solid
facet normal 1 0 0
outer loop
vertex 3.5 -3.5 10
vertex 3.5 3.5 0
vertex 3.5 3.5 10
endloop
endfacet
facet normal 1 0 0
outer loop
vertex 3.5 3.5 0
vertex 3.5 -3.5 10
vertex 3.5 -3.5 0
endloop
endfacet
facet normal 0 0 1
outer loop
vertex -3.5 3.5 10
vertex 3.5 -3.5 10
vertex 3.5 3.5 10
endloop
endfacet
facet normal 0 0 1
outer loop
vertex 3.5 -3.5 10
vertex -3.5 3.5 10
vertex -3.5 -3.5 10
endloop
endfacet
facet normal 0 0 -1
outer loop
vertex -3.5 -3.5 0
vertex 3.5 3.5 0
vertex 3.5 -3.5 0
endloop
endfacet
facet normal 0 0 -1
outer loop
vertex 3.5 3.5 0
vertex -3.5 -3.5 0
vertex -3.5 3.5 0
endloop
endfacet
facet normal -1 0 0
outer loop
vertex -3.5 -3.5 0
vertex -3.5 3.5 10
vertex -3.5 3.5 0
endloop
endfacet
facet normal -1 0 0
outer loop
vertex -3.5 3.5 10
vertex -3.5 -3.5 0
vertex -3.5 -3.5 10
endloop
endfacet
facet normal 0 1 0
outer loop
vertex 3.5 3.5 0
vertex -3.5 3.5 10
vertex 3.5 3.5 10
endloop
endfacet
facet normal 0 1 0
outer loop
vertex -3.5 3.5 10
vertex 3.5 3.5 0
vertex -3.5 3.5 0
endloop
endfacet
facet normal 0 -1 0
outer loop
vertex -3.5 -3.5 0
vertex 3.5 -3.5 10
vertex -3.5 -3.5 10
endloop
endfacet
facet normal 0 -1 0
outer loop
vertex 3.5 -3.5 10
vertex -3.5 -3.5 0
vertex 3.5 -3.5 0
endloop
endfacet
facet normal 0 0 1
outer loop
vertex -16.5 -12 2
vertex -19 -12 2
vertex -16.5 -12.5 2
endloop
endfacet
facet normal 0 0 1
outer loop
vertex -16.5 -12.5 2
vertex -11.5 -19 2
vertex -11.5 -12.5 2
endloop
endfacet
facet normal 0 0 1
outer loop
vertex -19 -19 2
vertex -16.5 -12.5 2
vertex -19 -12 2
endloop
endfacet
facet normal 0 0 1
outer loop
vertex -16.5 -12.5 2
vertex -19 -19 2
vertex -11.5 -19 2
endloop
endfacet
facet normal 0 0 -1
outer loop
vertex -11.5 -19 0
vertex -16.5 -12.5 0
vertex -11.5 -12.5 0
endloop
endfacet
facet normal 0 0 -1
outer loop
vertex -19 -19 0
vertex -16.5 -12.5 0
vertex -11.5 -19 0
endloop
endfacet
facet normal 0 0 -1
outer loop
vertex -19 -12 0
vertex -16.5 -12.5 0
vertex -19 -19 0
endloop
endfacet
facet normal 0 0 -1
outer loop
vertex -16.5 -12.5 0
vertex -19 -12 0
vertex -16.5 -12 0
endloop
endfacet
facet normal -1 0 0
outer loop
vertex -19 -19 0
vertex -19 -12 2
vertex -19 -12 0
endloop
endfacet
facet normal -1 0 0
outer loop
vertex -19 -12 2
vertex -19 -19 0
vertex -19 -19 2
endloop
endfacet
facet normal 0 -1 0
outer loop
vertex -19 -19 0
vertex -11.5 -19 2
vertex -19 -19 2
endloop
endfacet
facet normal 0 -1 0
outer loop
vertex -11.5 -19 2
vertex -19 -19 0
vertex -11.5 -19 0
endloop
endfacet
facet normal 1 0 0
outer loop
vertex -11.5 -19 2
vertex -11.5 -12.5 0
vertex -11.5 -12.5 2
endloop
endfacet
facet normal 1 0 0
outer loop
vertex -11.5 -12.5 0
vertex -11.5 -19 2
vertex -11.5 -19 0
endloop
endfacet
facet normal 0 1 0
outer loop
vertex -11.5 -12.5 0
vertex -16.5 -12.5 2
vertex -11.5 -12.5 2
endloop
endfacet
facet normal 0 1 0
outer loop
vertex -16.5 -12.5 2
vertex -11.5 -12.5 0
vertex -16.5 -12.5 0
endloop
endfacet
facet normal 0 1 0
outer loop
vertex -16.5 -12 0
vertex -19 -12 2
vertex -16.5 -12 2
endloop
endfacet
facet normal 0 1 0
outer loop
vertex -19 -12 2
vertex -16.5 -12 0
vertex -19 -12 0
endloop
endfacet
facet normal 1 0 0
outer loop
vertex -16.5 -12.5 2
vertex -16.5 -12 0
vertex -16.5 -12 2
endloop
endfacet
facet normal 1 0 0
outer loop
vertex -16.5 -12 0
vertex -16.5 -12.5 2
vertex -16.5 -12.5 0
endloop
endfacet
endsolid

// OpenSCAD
translate([0, 0, 5]) color([0,1,0,0.9]) cube([7, 7, 10], center=true);
translate([-18.75, -18.75, 1]) color([1,0,0]) cube([0.5, 0.5, 2], center=true);
translate([-18.25, -18.75, 1]) color([1,0,0]) cube([0.5, 0.5, 2], center=true);
translate([-17.75, -18.75, 1]) color([1,0,0]) cube([0.5, 0.5, 2], center=true);
translate([-17.25, -18.75, 1]) color([1,0,0]) cube([0.5, 0.5, 2], center=true);
translate([-16.75, -18.75, 1]) color([1,0,0]) cube([0.5, 0.5, 2], center=true);
translate([-16.25, -18.75, 1]) color([1,0,0]) cube([0.5, 0.5, 2], center=true);
translate([-15.75, -18.75, 1]) color([1,0,0]) cube([0.5, 0.5, 2], center=true);
translate([-15.25, -18.75, 1]) color([1,0,0]) cube([0.5, 0.5, 2], center=true);
translate([-14.75, -18.75, 1]) color([1,0,0]) cube([0.5, 0.5, 2], center=true);
translate([-14.25, -18.75, 1]) color([1,0,0]) cube([0.5, 0.5, 2], center=true);
translate([-13.75, -18.75, 1]) color([1,0,0]) cube([0.5, 0.5, 2], center=true);
translate([-13.25, -18.75, 1]) color([1,0,0]) cube([0.5, 0.5, 2], center=true);
translate([-12.75, -18.75, 1]) color([1,0,0]) cube([0.5, 0.5, 2], center=true);
translate([-12.25, -18.75, 1]) color([1,0,0]) cube([0.5, 0.5, 2], center=true);
translate([-11.75, -18.75, 1]) color([1,0,0]) cube([0.5, 0.5, 2], center=true);
translate([-18.75, -18.25, 1]) color([1,0,0]) cube([0.5, 0.5, 2], center=true);
translate([-18.25, -18.25, 1]) color([1,0,0]) cube([0.5, 0.5, 2], center=true);
translate([-17.75, -18.25, 1]) color([1,0,0]) cube([0.5, 0.5, 2], center=true);
translate([-17.25, -18.25, 1]) color([1,0,0]) cube([0.5, 0.5, 2], center=true);
translate([-16.75, -18.25, 1]) color([1,0,0]) cube([0.5, 0.5, 2], center=true);
translate([-16.25, -18.25, 1]) color([1,0,0]) cube([0.5, 0.5, 2], center=true);
translate([-15.75, -18.25, 1]) color([1,0,0]) cube([0.5, 0.5, 2], center=true);
translate([-15.25, -18.25, 1]) color([1,0,0]) cube([0.5, 0.5, 2], center=true);
translate([-14.75, -18.25, 1]) color([1,0,0]) cube([0.5, 0.5, 2], center=true);
translate([-14.25, -18.25, 1]) color([1,0,0]) cube([0.5, 0.5, 2], center=true);
translate([-13.75, -18.25, 1]) color([1,0,0]) cube([0.5, 0.5, 2], center=true);
translate([-13.25, -18.25, 1]) color([1,0,0]) cube([0.5, 0.5, 2], center=true);
translate([-12.75, -18.25, 1]) color([1,0,0]) cube([0.5, 0.5, 2], center=true);
translate([-12.25, -18.25, 1]) color([1,0,0]) cube([0.5, 0.5, 2], center=true);
translate([-11.75, -18.25, 1]) color([1,0,0]) cube([0.5, 0.5, 2], center=true);
translate([-18.75, -17.75, 1]) color([1,0,0]) cube([0.5, 0.5, 2], center=true);
translate([-18.25, -17.75, 1]) color([1,0,0]) cube([0.5, 0.5, 2], center=true);
translate([-17.75, -17.75, 1]) color([1,0,0]) cube([0.5, 0.5, 2], center=true);
translate([-17.25, -17.75, 1]) color([1,0,0]) cube([0.5, 0.5, 2], center=true);
translate([-16.75, -17.75, 1]) color([1,0,0]) cube([0.5, 0.5, 2], center=true);
translate([-16.25, -17.75, 1]) color([1,0,0]) cube([0.5, 0.5, 2], center=true);
translate([-15.75, -17.75, 1]) color([1,0,0]) cube([0.5, 0.5, 2], center=true);
translate([-15.25, -17.75, 1]) color([1,0,0]) cube([0.5, 0.5, 2], center=true);
translate([-14.75, -17.75, 1]) color([1,0,0]) cube([0.5, 0.5, 2], center=true);
translate([-14.25, -17.75, 1]) color([1,0,0]) cube([0.5, 0.5, 2], center=true);
translate([-13.75, -17.75, 1]) color([1,0,0]) cube([0.5, 0.5, 2], center=true);
translate([-13.25, -17.75, 1]) color([1,0,0]) cube([0.5, 0.5, 2], center=true);
translate([-12.75, -17.75, 1]) color([1,0,0]) cube([0.5, 0.5, 2], center=true);
translate([-12.25, -17.75, 1]) color([1,0,0]) cube([0.5, 0.5, 2], center=true);
translate([-11.75, -17.75, 1]) color([1,0,0]) cube([0.5, 0.5, 2], center=true);
translate([-18.75, -17.25, 1]) color([1,0,0]) cube([0.5, 0.5, 2], center=true);
translate([-18.25, -17.25, 1]) color([1,0,0]) cube([0.5, 0.5, 2], center=true);
translate([-17.75, -17.25, 1]) color([1,0,0]) cube([0.5, 0.5, 2], center=true);
translate([-17.25, -17.25, 1]) color([1,0,0]) cube([0.5, 0.5, 2], center=true);
translate([-16.75, -17.25, 1]) color([1,0,0]) cube([0.5, 0.5, 2], center=true);
translate([-16.25, -17.25, 1]) color([1,0,0]) cube([0.5, 0.5, 2], center=true);
translate([-15.75, -17.25, 1]) color([1,0,0]) cube([0.5, 0.5, 2], center=true);
translate([-15.25, -17.25, 1]) color([1,0,0]) cube([0.5, 0.5, 2], center=true);
translate([-14.75, -17.25, 1]) color([1,0,0]) cube([0.5, 0.5, 2], center=true);
translate([-14.25, -17.25, 1]) color([1,0,0]) cube([0.5, 0.5, 2], center=true);
translate([-13.75, -17.25, 1]) color([1,0,0]) cube([0.5, 0.5, 2], center=true);
translate([-13.25, -17.25, 1]) color([1,0,0]) cube([0.5, 0.5, 2], center=true);
translate([-12.75, -17.25, 1]) color([1,0,0]) cube([0.5, 0.5, 2], center=true);
translate([-12.25, -17.25, 1]) color([1,0,0]) cube([0.5, 0.5, 2], center=true);
translate([-11.75, -17.25, 1]) color([1,0,0]) cube([0.5, 0.5, 2], center=true);
translate([-18.75, -16.75, 1]) color([1,0,0]) cube([0.5, 0.5, 2], center=true);
translate([-18.25, -16.75, 1]) color([1,0,0]) cube([0.5, 0.5, 2], center=true);
translate([-17.75, -16.75, 1]) color([1,0,0]) cube([0.5, 0.5, 2], center=true);
translate([-17.25, -16.75, 1]) color([1,0,0]) cube([0.5, 0.5, 2], center=true);
translate([-16.75, -16.75, 1]) color([1,0,0]) cube([0.5, 0.5, 2], center=true);
translate([-16.25, -16.75, 1]) color([1,0,0]) cube([0.5, 0.5, 2], center=true);
translate([-15.75, -16.75, 1]) color([1,0,0]) cube([0.5, 0.5, 2], center=true);
translate([-15.25, -16.75, 1]) color([1,0,0]) cube([0.5, 0.5, 2], center=true);
translate([-14.75, -16.75, 1]) color([1,0,0]) cube([0.5, 0.5, 2], center=true);
translate([-14.25, -16.75, 1]) color([1,0,0]) cube([0.5, 0.5, 2], center=true);
translate([-13.75, -16.75, 1]) color([1,0,0]) cube([0.5, 0.5, 2], center=true);
translate([-13.25, -16.75, 1]) color([1,0,0]) cube([0.5, 0.5, 2], center=true);
translate([-12.75, -16.75, 1]) color([1,0,0]) cube([0.5, 0.5, 2], center=true);
translate([-12.25, -16.75, 1]) color([1,0,0]) cube([0.5, 0.5, 2], center=true);
translate([-11.75, -16.75, 1]) color([1,0,0]) cube([0.5, 0.5, 2], center=true);
translate([-18.75, -16.25, 1]) color([1,0,0]) cube([0.5, 0.5, 2], center=true);
translate([-18.25, -16.25, 1]) color([1,0,0]) cube([0.5, 0.5, 2], center=true);
translate([-17.75, -16.25, 1]) color([1,0,0]) cube([0.5, 0.5, 2], center=true);
translate([-17.25, -16.25, 1]) color([1,0,0]) cube([0.5, 0.5, 2], center=true);
translate([-16.75, -16.25, 1]) color([1,0,0]) cube([0.5, 0.5, 2], center=true);
translate([-16.25, -16.25, 1]) color([1,0,0]) cube([0.5, 0.5, 2], center=true);
translate([-15.75, -16.25, 1]) color([1,0,0]) cube([0.5, 0.5, 2], center=true);
translate([-15.25, -16.25, 1]) color([1,0,0]) cube([0.5, 0.5, 2], center=true);
translate([-14.75, -16.25, 1]) color([1,0,0]) cube([0.5, 0.5, 2], center=true);
translate([-14.25, -16.25, 1]) color([1,0,0]) cube([0.5, 0.5, 2], center=true);
translate([-13.75, -16.25, 1]) color([1,0,0]) cube([0.5, 0.5, 2], center=true);
translate([-13.25, -16.25, 1]) color([1,0,0]) cube([0.5, 0.5, 2], center=true);
translate([-12.75, -16.25, 1]) color([1,0,0]) cube([0.5, 0.5, 2], center=true);
translate([-12.25, -16.25, 1]) color([1,0,0]) cube([0.5, 0.5, 2], center=true);
translate([-11.75, -16.25, 1]) color([1,0,0]) cube([0.5, 0.5, 2], center=true);
translate([-18.75, -15.75, 1]) color([1,0,0]) cube([0.5, 0.5, 2], center=true);
translate([-18.25, -15.75, 1]) color([1,0,0]) cube([0.5, 0.5, 2], center=true);
translate([-17.75, -15.75, 1]) color([1,0,0]) cube([0.5, 0.5, 2], center=true);
translate([-17.25, -15.75, 1]) color([1,0,0]) cube([0.5, 0.5, 2], center=true);
translate([-16.75, -15.75, 1]) color([1,0,0]) cube([0.5, 0.5, 2], center=true);
translate([-16.25, -15.75, 1]) color([1,0,0]) cube([0.5, 0.5, 2], center=true);
translate([-15.75, -15.75, 1]) color([1,0,0]) cube([0.5, 0.5, 2], center=true);
translate([-15.25, -15.75, 1]) color([1,0,0]) cube([0.5, 0.5, 2], center=true);
translate([-14.75, -15.75, 1]) color([1,0,0]) cube([0.5, 0.5, 2], center=true);
translate([-14.25, -15.75, 1]) color([1,0,0]) cube([0.5, 0.5, 2], center=true);
translate([-13.75, -15.75, 1]) color([1,0,0]) cube([0.5, 0.5, 2], center=true);
translate([-13.25, -15.75, 1]) color([1,0,0]) cube([0.5, 0.5, 2], center=true);
translate([-12.75, -15.75, 1]) color([1,0,0]) cube([0.5, 0.5, 2], center=true);
translate([-12.25, -15.75, 1]) color([1,0,0]) cube([0.5, 0.5, 2], center=true);
translate([-11.75, -15.75, 1]) color([1,0,0]) cube([0.5, 0.5, 2], center=true);
translate([-18.75, -15.25, 1]) color([1,0,0]) cube([0.5, 0.5, 2], center=true);
translate([-18.25, -15.25, 1]) color([1,0,0]) cube([0.5, 0.5, 2], center=true);
translate([-17.75, -15.25, 1]) color([1,0,0]) cube([0.5, 0.5, 2], center=true);
translate([-17.25, -15.25, 1]) color([1,0,0]) cube([0.5, 0.5, 2], center=true);
translate([-16.75, -15.25, 1]) color([1,0,0]) cube([0.5, 0.5, 2], center=true);
translate([-16.25, -15.25, 1]) color([1,0,0]) cube([0.5, 0.5, 2], center=true);
translate([-15.75, -15.25, 1]) color([1,0,0]) cube([0.5, 0.5, 2], center=true);
translate([-15.25, -15.25, 1]) color([1,0,0]) cube([0.5, 0.5, 2], center=true);
translate([-14.75, -15.25, 1]) color([1,0,0]) cube([0.5, 0.5, 2], center=true);
translate([-14.25, -15.25, 1]) color([1,0,0]) cube([0.5, 0.5, 2], center=true);
translate([-13.75, -15.25, 1]) color([1,0,0]) cube([0.5, 0.5, 2], center=true);
translate([-13.25, -15.25, 1]) color([1,0,0]) cube([0.5, 0.5, 2], center=true);
translate([-12.75, -15.25, 1]) color([1,0,0]) cube([0.5, 0.5, 2], center=true);
translate([-12.25, -15.25, 1]) color([1,0,0]) cube([0.5, 0.5, 2], center=true);
translate([-11.75, -15.25, 1]) color([1,0,0]) cube([0.5, 0.5, 2], center=true);
translate([-18.75, -14.75, 1]) color([1,0,0]) cube([0.5, 0.5, 2], center=true);
translate([-18.25, -14.75, 1]) color([1,0,0]) cube([0.5, 0.5, 2], center=true);
translate([-17.75, -14.75, 1]) color([1,0,0]) cube([0.5, 0.5, 2], center=true);
translate([-17.25, -14.75, 1]) color([1,0,0]) cube([0.5, 0.5, 2], center=true);
translate([-16.75, -14.75, 1]) color([1,0,0]) cube([0.5, 0.5, 2], center=true);
translate([-16.25, -14.75, 1]) color([1,0,0]) cube([0.5, 0.5, 2], center=true);
translate([-15.75, -14.75, 1]) color([1,0,0]) cube([0.5, 0.5, 2], center=true);
translate([-15.25, -14.75, 1]) color([1,0,0]) cube([0.5, 0.5, 2], center=true);
translate([-14.75, -14.75, 1]) color([1,0,0]) cube([0.5, 0.5, 2], center=true);
translate([-14.25, -14.75, 1]) color([1,0,0]) cube([0.5, 0.5, 2], center=true);
translate([-13.75, -14.75, 1]) color([1,0,0]) cube([0.5, 0.5, 2], center=true);
translate([-13.25, -14.75, 1]) color([1,0,0]) cube([0.5, 0.5, 2], center=true);
translate([-12.75, -14.75, 1]) color([1,0,0]) cube([0.5, 0.5, 2], center=true);
translate([-12.25, -14.75, 1]) color([1,0,0]) cube([0.5, 0.5, 2], center=true);
translate([-11.75, -14.75, 1]) color([1,0,0]) cube([0.5, 0.5, 2], center=true);
translate([-18.75, -14.25, 1]) color([1,0,0]) cube([0.5, 0.5, 2], center=true);
translate([-18.25, -14.25, 1]) color([1,0,0]) cube([0.5, 0.5, 2], center=true);
translate([-17.75, -14.25, 1]) color([1,0,0]) cube([0.5, 0.5, 2], center=true);
translate([-17.25, -14.25, 1]) color([1,0,0]) cube([0.5, 0.5, 2], center=true);
translate([-16.75, -14.25, 1]) color([1,0,0]) cube([0.5, 0.5, 2], center=true);
translate([-16.25, -14.25, 1]) color([1,0,0]) cube([0.5, 0.5, 2], center=true);
translate([-15.75, -14.25, 1]) color([1,0,0]) cube([0.5, 0.5, 2], center=true);
translate([-15.25, -14.25, 1]) color([1,0,0]) cube([0.5, 0.5, 2], center=true);
translate([-14.75, -14.25, 1]) color([1,0,0]) cube([0.5, 0.5, 2], center=true);
translate([-14.25, -14.25, 1]) color([1,0,0]) cube([0.5, 0.5, 2], center=true);
translate([-13.75, -14.25, 1]) color([1,0,0]) cube([0.5, 0.5, 2], center=true);
translate([-13.25, -14.25, 1]) color([1,0,0]) cube([0.5, 0.5, 2], center=true);
translate([-12.75, -14.25, 1]) color([1,0,0]) cube([0.5, 0.5, 2], center=true);
translate([-12.25, -14.25, 1]) color([1,0,0]) cube([0.5, 0.5, 2], center=true);
translate([-11.75, -14.25, 1]) color([1,0,0]) cube([0.5, 0.5, 2], center=true);
translate([-18.75, -13.75, 1]) color([1,0,0]) cube([0.5, 0.5, 2], center=true);
translate([-18.25, -13.75, 1]) color([1,0,0]) cube([0.5, 0.5, 2], center=true);
translate([-17.75, -13.75, 1]) color([1,0,0]) cube([0.5, 0.5, 2], center=true);
translate([-17.25, -13.75, 1]) color([1,0,0]) cube([0.5, 0.5, 2], center=true);
translate([-16.75, -13.75, 1]) color([1,0,0]) cube([0.5, 0.5, 2], center=true);
translate([-16.25, -13.75, 1]) color([1,0,0]) cube([0.5, 0.5, 2], center=true);
translate([-15.75, -13.75, 1]) color([1,0,0]) cube([0.5, 0.5, 2], center=true);
translate([-15.25, -13.75, 1]) color([1,0,0]) cube([0.5, 0.5, 2], center=true);
translate([-14.75, -13.75, 1]) color([1,0,0]) cube([0.5, 0.5, 2], center=true);
translate([-14.25, -13.75, 1]) color([1,0,0]) cube([0.5, 0.5, 2], center=true);
translate([-13.75, -13.75, 1]) color([1,0,0]) cube([0.5, 0.5, 2], center=true);
translate([-13.25, -13.75, 1]) color([1,0,0]) cube([0.5, 0.5, 2], center=true);
translate([-12.75, -13.75, 1]) color([1,0,0]) cube([0.5, 0.5, 2], center=true);
translate([-12.25, -13.75, 1]) color([1,0,0]) cube([0.5, 0.5, 2], center=true);
translate([-11.75, -13.75, 1]) color([1,0,0]) cube([0.5, 0.5, 2], center=true);
translate([-18.75, -13.25, 1]) color([1,0,0]) cube([0.5, 0.5, 2], center=true);
translate([-18.25, -13.25, 1]) color([1,0,0]) cube([0.5, 0.5, 2], center=true);
translate([-17.75, -13.25, 1]) color([1,0,0]) cube([0.5, 0.5, 2], center=true);
translate([-17.25, -13.25, 1]) color([1,0,0]) cube([0.5, 0.5, 2], center=true);
translate([-16.75, -13.25, 1]) color([1,0,0]) cube([0.5, 0.5, 2], center=true);
translate([-16.25, -13.25, 1]) color([1,0,0]) cube([0.5, 0.5, 2], center=true);
translate([-15.75, -13.25, 1]) color([1,0,0]) cube([0.5, 0.5, 2], center=true);
translate([-15.25, -13.25, 1]) color([1,0,0]) cube([0.5, 0.5, 2], center=true);
translate([-14.75, -13.25, 1]) color([1,0,0]) cube([0.5, 0.5, 2], center=true);
translate([-14.25, -13.25, 1]) color([1,0,0]) cube([0.5, 0.5, 2], center=true);
translate([-13.75, -13.25, 1]) color([1,0,0]) cube([0.5, 0.5, 2], center=true);
translate([-13.25, -13.25, 1]) color([1,0,0]) cube([0.5, 0.5, 2], center=true);
translate([-12.75, -13.25, 1]) color([1,0,0]) cube([0.5, 0.5, 2], center=true);
translate([-12.25, -13.25, 1]) color([1,0,0]) cube([0.5, 0.5, 2], center=true);
translate([-11.75, -13.25, 1]) color([1,0,0]) cube([0.5, 0.5, 2], center=true);
translate([-18.75, -12.75, 1]) color([1,0,0]) cube([0.5, 0.5, 2], center=true);
translate([-18.25, -12.75, 1]) color([1,0,0]) cube([0.5, 0.5, 2], center=true);
translate([-17.75, -12.75, 1]) color([1,0,0]) cube([0.5, 0.5, 2], center=true);
translate([-17.25, -12.75, 1]) color([1,0,0]) cube([0.5, 0.5, 2], center=true);
translate([-16.75, -12.75, 1]) color([1,0,0]) cube([0.5, 0.5, 2], center=true);
translate([-16.25, -12.75, 1]) color([1,0,0]) cube([0.5, 0.5, 2], center=true);
translate([-15.75, -12.75, 1]) color([1,0,0]) cube([0.5, 0.5, 2], center=true);
translate([-15.25, -12.75, 1]) color([1,0,0]) cube([0.5, 0.5, 2], center=true);
translate([-14.75, -12.75, 1]) color([1,0,0]) cube([0.5, 0.5, 2], center=true);
translate([-14.25, -12.75, 1]) color([1,0,0]) cube([0.5, 0.5, 2], center=true);
translate([-13.75, -12.75, 1]) color([1,0,0]) cube([0.5, 0.5, 2], center=true);
translate([-13.25, -12.75, 1]) color([1,0,0]) cube([0.5, 0.5, 2], center=true);
translate([-12.75, -12.75, 1]) color([1,0,0]) cube([0.5, 0.5, 2], center=true);
translate([-12.25, -12.75, 1]) color([1,0,0]) cube([0.5, 0.5, 2], center=true);
translate([-11.75, -12.75, 1]) color([1,0,0]) cube([0.5, 0.5, 2], center=true);
translate([-18.75, -12.25, 1]) color([1,0,0]) cube([0.5, 0.5, 2], center=true);
translate([-18.25, -12.25, 1]) color([1,0,0]) cube([0.5, 0.5, 2], center=true);
translate([-17.75, -12.25, 1]) color([1,0,0]) cube([0.5, 0.5, 2], center=true);
translate([-17.25, -12.25, 1]) color([1,0,0]) cube([0.5, 0.5, 2], center=true);
translate([-16.75, -12.25, 1]) color([1,0,0]) cube([0.5, 0.5, 2], center=true);
